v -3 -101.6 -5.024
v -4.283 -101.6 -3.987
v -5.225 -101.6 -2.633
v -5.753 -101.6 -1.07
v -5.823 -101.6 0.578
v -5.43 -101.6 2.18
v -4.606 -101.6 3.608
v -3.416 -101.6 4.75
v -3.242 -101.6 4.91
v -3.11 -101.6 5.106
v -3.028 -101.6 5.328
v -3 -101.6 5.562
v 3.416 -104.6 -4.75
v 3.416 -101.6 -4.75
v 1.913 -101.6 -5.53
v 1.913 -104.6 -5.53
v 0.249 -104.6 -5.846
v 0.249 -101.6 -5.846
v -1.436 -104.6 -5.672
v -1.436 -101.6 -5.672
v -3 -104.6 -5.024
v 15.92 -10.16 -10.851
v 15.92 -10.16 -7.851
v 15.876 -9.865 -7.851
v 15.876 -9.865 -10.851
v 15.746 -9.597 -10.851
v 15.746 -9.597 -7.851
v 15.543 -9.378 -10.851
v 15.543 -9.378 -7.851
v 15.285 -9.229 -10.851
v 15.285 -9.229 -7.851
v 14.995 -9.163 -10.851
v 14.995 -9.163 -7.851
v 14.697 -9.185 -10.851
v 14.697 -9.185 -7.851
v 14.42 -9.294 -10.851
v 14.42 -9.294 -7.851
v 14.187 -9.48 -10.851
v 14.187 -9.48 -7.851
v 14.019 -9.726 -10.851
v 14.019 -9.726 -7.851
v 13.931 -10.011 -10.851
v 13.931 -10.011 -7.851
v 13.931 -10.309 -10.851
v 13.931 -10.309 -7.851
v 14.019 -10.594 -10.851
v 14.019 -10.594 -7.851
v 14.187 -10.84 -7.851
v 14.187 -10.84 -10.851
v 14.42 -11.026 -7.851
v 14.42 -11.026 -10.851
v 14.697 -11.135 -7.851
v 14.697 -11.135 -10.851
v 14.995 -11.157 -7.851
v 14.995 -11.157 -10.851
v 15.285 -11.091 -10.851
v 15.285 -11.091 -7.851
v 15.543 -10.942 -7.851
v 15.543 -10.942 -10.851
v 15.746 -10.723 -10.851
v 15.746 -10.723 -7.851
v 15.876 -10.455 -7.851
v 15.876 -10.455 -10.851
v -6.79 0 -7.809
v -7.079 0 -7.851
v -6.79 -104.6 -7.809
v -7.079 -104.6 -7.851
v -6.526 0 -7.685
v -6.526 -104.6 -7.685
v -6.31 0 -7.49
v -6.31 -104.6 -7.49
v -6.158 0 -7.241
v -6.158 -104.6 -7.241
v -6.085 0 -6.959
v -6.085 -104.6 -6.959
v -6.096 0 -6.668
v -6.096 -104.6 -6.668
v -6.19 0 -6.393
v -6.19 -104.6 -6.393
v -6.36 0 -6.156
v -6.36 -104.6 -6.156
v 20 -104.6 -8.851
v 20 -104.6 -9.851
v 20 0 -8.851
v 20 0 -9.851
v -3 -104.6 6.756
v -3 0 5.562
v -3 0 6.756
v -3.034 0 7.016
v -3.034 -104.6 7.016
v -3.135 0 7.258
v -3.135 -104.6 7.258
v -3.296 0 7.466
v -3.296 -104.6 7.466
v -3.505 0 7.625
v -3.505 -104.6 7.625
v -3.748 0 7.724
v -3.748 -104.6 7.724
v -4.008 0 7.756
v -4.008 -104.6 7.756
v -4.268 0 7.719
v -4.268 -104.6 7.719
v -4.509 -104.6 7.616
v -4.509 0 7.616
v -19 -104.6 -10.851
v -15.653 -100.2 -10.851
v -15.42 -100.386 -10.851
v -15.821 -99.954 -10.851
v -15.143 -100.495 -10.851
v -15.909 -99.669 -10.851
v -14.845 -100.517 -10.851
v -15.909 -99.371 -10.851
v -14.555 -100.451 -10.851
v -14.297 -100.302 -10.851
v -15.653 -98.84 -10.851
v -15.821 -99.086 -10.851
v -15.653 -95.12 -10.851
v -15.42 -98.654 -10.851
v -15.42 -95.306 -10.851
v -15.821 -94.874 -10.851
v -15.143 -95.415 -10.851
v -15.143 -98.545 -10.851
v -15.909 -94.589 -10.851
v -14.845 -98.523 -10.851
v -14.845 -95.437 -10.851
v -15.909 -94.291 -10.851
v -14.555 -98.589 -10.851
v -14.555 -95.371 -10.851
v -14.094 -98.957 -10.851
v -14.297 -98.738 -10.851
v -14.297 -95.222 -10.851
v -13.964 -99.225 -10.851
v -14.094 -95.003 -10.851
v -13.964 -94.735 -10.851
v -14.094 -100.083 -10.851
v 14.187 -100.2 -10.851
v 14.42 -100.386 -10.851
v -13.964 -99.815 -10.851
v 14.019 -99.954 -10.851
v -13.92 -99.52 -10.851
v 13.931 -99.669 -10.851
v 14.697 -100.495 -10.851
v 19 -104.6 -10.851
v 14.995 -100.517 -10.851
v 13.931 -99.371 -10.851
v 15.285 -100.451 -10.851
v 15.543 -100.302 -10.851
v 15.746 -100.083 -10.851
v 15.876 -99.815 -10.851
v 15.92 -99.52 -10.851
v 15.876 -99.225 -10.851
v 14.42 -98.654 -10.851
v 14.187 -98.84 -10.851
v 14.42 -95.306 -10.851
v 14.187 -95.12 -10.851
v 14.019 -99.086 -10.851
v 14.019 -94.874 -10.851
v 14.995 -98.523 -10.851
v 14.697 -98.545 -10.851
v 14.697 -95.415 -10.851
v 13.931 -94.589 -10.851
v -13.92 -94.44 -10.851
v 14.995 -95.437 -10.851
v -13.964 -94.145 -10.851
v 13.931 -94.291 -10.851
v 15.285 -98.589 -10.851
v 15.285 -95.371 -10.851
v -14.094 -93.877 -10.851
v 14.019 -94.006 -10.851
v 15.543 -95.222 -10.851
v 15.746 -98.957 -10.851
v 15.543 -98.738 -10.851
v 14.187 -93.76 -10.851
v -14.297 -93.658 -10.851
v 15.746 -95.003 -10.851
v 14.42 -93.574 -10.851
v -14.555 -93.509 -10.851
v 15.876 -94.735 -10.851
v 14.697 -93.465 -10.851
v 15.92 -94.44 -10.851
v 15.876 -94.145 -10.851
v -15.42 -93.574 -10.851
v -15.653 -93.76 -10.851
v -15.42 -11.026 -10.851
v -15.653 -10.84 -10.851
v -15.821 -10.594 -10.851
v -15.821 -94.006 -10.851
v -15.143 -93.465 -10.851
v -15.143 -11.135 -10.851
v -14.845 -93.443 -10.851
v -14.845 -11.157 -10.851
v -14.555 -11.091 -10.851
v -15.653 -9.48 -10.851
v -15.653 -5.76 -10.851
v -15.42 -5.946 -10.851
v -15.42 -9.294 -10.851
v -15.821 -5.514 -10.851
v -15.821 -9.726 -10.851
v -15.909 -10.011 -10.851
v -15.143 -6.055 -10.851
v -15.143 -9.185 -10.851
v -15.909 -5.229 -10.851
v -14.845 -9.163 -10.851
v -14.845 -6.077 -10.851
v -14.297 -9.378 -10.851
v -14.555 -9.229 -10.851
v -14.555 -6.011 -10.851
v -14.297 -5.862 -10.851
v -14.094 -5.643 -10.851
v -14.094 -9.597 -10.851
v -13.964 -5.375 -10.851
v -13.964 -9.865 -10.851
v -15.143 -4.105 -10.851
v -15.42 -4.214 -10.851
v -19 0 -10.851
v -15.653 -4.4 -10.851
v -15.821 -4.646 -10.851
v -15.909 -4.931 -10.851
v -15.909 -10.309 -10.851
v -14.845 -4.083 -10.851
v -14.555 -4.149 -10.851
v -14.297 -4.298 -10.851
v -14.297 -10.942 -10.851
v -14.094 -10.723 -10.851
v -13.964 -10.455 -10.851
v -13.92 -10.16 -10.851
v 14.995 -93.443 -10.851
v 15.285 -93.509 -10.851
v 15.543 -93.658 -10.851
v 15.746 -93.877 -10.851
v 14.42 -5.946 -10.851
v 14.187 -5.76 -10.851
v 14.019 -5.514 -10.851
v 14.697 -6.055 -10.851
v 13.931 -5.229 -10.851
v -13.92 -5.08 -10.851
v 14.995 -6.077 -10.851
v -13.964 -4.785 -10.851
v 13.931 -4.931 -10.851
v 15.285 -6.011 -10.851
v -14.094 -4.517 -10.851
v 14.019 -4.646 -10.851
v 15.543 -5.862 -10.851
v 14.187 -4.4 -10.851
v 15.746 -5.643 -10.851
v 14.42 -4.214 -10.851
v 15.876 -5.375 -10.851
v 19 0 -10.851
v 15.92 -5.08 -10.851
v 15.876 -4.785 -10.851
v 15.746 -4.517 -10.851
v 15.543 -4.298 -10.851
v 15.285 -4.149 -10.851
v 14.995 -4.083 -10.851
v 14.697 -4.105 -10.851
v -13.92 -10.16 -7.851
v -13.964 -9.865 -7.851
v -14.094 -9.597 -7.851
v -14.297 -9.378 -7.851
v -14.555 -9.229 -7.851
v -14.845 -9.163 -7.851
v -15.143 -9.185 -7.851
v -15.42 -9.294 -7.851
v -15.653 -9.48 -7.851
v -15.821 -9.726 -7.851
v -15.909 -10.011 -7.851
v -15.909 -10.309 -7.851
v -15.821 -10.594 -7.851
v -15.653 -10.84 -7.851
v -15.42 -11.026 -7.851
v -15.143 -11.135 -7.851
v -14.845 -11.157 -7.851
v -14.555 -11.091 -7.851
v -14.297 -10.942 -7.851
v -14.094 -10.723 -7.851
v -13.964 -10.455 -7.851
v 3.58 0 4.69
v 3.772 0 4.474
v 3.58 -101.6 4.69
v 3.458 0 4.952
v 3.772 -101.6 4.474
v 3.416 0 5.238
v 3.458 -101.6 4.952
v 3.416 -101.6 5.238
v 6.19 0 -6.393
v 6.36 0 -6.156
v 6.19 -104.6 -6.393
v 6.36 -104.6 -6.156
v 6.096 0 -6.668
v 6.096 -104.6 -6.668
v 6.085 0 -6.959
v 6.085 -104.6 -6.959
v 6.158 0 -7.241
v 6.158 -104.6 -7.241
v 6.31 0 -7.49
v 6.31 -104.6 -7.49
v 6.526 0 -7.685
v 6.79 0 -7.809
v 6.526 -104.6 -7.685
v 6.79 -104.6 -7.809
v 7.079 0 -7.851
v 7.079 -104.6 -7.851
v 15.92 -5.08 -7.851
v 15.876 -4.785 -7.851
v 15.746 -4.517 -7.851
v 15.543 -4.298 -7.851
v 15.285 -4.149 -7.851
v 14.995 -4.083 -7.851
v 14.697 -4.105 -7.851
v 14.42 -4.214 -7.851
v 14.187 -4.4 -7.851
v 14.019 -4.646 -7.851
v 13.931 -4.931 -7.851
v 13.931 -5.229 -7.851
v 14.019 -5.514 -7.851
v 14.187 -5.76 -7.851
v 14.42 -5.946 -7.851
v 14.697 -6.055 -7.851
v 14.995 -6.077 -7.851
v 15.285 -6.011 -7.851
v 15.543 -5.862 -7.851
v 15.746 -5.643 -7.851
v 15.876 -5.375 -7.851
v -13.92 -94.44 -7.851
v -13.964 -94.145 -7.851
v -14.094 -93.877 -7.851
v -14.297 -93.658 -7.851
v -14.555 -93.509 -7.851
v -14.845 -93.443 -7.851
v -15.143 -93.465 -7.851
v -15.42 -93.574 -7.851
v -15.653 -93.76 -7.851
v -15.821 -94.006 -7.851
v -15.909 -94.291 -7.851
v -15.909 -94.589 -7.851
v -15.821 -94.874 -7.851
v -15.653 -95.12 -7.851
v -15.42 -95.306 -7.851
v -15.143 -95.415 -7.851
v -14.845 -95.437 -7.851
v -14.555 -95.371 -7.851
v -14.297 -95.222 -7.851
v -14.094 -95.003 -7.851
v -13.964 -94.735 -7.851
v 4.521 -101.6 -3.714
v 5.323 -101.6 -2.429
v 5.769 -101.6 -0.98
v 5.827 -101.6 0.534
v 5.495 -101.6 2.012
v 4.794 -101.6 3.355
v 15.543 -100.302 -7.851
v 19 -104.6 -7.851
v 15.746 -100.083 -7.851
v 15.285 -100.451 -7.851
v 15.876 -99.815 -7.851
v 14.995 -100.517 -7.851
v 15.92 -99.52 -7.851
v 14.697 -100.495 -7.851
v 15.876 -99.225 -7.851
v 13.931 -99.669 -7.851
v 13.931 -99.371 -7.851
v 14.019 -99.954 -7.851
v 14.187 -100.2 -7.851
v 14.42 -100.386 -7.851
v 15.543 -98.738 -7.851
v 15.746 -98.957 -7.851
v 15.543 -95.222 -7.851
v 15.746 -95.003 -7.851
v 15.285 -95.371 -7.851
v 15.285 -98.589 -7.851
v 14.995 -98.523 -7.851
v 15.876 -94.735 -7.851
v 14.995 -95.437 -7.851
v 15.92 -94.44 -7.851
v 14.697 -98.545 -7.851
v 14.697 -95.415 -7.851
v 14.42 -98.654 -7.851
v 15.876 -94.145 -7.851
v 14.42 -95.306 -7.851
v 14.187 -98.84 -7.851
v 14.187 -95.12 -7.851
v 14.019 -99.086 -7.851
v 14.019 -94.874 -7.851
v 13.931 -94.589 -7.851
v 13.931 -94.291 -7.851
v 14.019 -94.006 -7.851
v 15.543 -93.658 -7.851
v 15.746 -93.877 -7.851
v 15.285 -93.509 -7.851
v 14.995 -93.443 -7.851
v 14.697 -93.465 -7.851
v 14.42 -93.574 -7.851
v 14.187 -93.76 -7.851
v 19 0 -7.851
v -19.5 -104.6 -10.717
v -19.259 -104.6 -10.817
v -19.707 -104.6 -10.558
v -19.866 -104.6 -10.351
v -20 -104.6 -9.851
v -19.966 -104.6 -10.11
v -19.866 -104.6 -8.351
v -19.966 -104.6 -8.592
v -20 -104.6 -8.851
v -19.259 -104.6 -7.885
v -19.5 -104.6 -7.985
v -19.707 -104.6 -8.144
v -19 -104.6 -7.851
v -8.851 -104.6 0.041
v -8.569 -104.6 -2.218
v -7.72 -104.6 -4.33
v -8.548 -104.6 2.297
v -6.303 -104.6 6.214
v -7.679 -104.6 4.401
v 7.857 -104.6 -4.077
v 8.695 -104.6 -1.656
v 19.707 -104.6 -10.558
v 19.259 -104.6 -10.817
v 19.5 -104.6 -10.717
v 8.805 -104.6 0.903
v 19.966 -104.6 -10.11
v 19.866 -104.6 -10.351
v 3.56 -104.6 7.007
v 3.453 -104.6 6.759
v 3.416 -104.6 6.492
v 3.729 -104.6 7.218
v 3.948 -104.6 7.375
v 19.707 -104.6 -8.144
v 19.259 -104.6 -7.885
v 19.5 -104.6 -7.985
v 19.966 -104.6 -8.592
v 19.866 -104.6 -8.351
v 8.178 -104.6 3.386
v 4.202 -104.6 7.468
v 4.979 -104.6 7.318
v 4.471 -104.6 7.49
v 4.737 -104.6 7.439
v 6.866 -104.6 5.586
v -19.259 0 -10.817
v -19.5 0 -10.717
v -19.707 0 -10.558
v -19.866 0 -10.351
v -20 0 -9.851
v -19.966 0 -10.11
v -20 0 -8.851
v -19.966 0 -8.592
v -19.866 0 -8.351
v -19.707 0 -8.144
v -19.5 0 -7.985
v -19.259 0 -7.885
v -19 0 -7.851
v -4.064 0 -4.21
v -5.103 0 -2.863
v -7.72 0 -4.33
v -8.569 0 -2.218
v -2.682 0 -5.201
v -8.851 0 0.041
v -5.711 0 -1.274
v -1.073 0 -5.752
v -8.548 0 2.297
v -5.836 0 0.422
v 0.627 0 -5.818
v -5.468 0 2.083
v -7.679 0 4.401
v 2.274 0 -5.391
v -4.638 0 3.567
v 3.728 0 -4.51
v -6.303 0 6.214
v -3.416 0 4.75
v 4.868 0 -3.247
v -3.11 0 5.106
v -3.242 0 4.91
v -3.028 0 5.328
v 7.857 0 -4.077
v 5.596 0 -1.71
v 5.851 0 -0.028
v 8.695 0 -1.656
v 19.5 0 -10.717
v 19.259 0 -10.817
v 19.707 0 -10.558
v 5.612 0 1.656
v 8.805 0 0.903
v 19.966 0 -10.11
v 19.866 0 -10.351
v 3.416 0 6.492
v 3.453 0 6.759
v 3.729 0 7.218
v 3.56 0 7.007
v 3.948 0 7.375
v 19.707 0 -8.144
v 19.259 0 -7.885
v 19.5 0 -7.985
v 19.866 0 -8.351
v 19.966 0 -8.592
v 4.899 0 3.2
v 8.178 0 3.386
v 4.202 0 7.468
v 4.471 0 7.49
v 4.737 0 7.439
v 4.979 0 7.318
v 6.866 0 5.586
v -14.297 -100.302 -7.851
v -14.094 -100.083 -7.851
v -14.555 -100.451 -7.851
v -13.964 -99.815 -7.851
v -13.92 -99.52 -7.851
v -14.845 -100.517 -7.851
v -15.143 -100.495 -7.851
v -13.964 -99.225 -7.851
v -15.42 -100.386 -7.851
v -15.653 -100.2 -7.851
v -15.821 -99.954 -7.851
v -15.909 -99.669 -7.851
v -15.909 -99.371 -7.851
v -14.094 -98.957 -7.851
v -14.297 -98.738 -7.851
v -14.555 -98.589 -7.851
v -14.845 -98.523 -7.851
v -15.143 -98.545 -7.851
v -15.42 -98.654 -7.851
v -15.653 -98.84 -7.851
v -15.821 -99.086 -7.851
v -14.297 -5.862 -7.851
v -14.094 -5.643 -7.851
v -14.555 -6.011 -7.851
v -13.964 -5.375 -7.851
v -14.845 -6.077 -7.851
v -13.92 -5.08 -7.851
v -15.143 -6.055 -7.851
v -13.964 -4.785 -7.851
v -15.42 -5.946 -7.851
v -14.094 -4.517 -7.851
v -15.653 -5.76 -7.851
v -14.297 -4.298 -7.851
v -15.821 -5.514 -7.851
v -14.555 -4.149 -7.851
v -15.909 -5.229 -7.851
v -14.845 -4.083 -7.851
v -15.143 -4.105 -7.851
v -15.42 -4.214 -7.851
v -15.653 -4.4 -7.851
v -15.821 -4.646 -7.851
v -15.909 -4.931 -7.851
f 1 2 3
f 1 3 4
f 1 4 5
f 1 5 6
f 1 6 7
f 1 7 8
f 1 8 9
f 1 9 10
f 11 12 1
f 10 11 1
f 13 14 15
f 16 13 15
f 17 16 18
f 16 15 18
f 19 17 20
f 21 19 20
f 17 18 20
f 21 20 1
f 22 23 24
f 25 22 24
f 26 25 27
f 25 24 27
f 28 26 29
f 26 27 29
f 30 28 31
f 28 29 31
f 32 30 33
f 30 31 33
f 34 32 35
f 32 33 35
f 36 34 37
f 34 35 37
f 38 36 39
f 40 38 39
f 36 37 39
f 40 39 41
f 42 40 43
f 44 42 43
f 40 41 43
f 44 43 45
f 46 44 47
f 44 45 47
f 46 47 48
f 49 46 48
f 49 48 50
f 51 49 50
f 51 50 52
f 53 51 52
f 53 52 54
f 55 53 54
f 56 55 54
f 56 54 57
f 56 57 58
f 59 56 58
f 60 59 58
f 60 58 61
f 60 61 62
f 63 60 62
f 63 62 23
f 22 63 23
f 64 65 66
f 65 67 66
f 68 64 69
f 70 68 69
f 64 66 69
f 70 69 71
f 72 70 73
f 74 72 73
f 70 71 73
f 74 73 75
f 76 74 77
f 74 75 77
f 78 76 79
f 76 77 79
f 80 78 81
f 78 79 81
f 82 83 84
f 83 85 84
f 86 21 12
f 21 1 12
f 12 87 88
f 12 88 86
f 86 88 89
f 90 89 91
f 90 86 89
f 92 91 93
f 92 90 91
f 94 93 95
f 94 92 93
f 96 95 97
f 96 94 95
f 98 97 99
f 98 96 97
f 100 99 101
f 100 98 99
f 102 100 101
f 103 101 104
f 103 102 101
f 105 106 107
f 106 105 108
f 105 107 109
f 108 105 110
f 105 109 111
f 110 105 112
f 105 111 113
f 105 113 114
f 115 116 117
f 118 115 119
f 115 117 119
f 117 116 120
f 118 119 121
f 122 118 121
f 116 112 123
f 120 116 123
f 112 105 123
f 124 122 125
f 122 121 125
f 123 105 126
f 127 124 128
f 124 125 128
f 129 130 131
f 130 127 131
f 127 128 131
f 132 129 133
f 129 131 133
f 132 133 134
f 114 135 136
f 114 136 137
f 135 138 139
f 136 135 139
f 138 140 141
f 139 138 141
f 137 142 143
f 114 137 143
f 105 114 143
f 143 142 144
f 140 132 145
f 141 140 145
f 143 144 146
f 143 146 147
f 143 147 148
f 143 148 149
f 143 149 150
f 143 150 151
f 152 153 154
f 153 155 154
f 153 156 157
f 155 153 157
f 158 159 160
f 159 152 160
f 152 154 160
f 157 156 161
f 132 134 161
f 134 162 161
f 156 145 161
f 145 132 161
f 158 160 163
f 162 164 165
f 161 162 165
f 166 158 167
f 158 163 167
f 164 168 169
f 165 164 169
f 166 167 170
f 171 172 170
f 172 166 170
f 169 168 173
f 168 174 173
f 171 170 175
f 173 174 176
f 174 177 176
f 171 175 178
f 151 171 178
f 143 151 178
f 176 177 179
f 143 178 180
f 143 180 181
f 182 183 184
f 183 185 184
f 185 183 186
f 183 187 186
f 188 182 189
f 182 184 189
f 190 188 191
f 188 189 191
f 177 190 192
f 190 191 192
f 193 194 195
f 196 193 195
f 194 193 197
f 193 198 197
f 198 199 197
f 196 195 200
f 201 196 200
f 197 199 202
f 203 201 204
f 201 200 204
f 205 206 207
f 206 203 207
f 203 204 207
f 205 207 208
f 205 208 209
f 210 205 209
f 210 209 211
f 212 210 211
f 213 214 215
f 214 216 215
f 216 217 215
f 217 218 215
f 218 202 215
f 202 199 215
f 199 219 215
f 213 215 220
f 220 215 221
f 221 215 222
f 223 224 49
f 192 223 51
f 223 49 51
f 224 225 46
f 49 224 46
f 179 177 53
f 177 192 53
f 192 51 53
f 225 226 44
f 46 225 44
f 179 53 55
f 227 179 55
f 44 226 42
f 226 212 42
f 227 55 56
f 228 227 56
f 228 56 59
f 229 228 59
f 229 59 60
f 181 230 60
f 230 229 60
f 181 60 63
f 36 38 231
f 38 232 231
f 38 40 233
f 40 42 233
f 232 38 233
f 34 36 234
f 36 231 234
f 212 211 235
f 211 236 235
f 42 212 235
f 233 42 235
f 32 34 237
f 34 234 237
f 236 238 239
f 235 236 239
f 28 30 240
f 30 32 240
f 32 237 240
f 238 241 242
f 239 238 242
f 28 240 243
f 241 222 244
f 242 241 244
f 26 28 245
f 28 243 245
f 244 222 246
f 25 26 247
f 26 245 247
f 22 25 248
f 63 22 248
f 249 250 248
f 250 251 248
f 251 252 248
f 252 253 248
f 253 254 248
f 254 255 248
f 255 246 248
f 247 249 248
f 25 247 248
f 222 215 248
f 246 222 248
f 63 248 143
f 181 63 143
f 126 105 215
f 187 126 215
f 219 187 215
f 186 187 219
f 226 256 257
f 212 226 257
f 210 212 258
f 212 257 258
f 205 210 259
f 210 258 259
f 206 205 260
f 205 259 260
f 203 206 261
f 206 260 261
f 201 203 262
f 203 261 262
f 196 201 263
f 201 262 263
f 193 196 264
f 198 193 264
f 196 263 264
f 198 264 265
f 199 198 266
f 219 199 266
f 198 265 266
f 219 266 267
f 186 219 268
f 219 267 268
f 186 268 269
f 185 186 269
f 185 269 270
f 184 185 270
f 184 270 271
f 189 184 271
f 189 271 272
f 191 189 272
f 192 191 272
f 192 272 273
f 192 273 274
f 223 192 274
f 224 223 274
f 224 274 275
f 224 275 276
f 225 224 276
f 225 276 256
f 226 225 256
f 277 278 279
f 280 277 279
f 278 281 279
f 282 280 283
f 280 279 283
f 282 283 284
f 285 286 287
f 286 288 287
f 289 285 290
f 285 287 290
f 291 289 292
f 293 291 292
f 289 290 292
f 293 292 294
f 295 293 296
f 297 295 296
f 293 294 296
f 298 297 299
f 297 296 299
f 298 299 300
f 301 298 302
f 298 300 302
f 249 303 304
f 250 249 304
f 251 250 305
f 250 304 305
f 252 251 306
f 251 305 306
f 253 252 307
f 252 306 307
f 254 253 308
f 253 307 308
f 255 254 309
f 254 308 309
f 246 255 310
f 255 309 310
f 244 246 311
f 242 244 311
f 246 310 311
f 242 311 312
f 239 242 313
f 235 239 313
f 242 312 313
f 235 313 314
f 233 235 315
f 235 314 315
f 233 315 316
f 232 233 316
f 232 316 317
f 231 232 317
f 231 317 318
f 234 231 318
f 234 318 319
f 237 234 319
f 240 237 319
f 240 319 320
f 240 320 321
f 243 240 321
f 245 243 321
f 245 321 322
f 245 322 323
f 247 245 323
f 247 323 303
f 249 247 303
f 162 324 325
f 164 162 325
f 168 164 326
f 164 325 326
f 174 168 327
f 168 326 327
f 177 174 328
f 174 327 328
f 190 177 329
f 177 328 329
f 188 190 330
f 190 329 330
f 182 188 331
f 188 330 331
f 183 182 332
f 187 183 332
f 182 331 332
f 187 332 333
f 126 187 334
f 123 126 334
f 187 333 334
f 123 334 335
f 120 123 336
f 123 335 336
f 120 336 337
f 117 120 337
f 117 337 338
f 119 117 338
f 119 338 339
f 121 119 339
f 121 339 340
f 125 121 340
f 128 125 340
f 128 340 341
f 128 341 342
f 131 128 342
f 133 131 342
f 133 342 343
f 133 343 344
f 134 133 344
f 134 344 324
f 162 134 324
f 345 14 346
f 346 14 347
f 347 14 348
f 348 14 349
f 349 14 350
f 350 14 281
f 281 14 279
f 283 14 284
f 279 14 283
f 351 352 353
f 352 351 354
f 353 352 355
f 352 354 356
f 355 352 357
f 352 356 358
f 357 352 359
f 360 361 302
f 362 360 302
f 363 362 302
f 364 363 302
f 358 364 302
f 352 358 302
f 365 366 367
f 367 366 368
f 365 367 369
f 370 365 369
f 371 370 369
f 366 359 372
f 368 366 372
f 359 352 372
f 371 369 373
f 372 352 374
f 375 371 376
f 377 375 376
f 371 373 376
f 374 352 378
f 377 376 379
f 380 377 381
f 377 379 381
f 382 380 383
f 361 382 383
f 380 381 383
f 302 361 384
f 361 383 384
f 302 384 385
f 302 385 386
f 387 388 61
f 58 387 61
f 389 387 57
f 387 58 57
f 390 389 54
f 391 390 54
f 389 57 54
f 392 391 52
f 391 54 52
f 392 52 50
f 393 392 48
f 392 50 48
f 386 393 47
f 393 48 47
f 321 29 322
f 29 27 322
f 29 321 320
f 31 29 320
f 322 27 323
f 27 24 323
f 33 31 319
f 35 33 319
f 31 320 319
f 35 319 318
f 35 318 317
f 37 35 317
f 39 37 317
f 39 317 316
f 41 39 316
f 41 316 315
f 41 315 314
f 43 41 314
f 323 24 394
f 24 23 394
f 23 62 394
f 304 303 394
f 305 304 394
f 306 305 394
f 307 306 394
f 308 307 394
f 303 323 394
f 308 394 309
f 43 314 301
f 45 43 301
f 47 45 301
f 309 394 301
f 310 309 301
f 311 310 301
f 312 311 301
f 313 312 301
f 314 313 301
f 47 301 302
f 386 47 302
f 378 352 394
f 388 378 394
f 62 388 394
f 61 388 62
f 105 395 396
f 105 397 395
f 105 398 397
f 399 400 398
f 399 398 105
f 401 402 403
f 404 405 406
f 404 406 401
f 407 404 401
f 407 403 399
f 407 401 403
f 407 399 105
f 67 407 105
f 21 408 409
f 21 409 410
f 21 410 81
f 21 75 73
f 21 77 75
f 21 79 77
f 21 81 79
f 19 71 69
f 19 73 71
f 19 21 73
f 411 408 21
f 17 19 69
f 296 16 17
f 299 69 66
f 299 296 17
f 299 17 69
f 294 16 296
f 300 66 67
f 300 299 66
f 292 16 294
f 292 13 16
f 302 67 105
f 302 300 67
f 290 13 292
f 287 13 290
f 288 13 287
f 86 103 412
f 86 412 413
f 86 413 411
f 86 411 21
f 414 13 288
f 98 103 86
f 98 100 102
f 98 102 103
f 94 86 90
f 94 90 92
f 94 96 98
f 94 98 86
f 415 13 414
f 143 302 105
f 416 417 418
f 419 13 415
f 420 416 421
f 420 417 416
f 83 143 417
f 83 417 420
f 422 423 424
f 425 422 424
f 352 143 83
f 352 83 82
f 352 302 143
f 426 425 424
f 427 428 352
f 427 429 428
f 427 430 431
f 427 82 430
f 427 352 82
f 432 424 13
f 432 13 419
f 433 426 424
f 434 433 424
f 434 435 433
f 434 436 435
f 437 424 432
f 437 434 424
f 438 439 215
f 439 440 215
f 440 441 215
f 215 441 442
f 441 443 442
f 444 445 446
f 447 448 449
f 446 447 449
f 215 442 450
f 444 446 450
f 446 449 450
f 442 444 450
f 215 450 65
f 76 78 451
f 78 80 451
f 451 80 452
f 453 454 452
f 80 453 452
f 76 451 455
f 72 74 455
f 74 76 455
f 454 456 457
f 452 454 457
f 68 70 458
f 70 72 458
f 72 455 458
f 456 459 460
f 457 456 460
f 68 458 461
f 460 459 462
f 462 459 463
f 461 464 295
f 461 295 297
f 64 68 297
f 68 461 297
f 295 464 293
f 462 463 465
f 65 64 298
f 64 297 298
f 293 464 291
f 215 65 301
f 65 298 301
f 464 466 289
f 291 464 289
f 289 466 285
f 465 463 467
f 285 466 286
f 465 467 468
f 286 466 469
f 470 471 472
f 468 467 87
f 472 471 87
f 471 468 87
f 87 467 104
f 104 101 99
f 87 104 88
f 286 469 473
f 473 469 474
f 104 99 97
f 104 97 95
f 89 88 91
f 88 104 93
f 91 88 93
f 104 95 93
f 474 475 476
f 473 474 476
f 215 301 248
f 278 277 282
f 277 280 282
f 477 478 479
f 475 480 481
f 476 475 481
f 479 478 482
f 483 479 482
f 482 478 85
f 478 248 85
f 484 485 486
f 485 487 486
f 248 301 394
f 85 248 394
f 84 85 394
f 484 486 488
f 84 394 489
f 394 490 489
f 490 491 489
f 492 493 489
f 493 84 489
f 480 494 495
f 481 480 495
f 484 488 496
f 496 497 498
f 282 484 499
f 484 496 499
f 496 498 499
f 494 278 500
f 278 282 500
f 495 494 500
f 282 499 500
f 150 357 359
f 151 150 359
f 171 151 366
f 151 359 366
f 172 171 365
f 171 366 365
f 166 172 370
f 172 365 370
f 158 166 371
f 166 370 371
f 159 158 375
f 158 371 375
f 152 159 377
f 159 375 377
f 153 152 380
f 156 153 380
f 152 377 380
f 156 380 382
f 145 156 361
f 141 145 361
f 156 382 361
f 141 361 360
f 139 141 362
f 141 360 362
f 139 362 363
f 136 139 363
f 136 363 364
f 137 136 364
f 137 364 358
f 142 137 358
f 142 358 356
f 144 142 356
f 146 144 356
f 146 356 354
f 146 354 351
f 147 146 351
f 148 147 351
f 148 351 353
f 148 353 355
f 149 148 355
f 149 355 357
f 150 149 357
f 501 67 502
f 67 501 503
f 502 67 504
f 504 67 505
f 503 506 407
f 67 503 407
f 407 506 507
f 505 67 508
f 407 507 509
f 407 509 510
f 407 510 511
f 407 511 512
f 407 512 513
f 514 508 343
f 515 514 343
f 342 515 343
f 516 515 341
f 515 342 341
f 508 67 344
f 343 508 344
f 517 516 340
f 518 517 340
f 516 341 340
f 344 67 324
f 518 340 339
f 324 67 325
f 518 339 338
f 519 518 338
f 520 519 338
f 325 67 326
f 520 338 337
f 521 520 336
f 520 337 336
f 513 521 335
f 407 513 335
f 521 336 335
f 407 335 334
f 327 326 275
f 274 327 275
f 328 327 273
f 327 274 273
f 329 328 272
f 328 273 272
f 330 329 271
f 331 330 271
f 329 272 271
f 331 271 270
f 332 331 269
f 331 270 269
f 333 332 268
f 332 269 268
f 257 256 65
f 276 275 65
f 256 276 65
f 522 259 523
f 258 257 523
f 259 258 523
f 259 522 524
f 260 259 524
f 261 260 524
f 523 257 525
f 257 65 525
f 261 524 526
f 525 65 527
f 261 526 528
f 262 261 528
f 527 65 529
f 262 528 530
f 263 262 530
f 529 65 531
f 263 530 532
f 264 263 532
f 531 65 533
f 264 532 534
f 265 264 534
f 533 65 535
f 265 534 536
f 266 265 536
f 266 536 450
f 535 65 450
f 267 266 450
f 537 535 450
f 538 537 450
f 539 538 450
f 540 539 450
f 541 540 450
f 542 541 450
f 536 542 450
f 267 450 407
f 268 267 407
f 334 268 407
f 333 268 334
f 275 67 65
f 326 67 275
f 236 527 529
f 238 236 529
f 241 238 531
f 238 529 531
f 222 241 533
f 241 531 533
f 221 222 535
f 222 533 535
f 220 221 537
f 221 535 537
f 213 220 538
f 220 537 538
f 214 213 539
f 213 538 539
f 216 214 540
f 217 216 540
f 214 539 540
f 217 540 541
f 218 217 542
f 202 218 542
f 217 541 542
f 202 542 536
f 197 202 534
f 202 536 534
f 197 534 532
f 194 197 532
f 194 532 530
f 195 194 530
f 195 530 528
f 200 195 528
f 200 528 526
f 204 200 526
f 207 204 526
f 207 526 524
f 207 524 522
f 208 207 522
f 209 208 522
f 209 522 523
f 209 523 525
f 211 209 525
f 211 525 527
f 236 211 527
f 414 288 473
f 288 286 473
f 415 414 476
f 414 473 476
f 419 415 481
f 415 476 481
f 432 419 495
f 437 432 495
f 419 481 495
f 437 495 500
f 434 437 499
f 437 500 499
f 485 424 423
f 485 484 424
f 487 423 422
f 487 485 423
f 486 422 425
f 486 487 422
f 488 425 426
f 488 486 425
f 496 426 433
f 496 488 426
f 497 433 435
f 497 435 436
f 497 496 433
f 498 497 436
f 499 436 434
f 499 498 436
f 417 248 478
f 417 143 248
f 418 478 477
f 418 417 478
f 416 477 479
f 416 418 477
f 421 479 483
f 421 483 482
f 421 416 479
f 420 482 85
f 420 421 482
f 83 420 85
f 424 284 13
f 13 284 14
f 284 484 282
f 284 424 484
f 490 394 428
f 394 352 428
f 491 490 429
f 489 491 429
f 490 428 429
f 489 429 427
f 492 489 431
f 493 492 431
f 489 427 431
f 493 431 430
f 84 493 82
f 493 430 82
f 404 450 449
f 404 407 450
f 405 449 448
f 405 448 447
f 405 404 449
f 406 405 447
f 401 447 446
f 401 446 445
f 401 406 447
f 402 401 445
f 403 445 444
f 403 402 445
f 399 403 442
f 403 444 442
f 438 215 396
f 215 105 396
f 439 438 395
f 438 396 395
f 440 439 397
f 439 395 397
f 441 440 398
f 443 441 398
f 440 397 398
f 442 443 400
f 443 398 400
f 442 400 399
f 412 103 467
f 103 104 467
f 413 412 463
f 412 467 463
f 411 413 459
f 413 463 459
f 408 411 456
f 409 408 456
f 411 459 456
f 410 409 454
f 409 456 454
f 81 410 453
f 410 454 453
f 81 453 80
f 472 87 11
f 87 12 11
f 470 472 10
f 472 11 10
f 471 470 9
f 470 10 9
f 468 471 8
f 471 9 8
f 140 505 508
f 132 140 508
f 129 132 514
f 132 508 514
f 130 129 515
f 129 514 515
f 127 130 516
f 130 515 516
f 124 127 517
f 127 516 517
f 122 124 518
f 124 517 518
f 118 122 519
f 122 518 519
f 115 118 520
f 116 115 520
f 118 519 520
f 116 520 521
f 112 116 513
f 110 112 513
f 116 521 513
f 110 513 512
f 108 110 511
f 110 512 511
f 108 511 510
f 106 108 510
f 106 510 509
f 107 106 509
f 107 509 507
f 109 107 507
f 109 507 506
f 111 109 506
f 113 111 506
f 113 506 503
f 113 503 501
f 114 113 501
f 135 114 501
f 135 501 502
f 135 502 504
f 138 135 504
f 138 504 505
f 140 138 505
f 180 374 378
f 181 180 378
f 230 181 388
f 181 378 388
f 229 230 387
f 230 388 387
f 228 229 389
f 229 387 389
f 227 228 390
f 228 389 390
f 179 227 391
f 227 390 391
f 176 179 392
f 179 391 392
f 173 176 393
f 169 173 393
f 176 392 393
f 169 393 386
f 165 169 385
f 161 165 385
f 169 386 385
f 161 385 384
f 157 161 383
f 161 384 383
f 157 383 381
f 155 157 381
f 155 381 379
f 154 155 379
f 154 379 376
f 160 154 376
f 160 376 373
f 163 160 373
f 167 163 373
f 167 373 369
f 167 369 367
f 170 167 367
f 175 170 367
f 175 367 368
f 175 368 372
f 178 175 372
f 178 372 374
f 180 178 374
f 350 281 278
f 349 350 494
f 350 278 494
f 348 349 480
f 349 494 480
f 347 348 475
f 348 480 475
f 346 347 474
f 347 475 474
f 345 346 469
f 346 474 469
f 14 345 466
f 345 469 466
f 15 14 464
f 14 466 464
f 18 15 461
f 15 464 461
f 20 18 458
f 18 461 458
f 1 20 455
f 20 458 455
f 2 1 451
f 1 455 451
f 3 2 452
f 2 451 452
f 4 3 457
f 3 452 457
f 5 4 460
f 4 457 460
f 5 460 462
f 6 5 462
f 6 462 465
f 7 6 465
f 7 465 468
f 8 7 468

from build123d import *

# Parameters (mm, degrees)
F1_DEPTH = 101.6
F3_DEPTH = 3
F4_R     = 1
F5_DEPTH = 25.4
F6_R     = 1
F7_R     = 1


with BuildPart() as f1:
    # F0 (on Front) → F1 (new body)
    with BuildSketch(Plane.XZ):
        with BuildLine():
            ThreePointArc((3.4161663997, 4.7504878758), (-0.2489109402, -5.8459705159), (-3, 5.0236767341))
            Line((-3, 5.0236767341), (-3, 8.3273603964))
            ThreePointArc((-3, 8.3273603964), (-8.83136125, 0.5932871507), (-4.0868734277, -7.8512672071))
            Line((-4.0868734277, -7.8512672071), (-20, -7.8512672071))
            Line((-20, -7.8512672071), (-20, -10.8512672071))
            Line((-20, -10.8512672071), (20, -10.8512672071))
            Line((20, -10.8512672071), (20, -7.8512672071))
            Line((20, -7.8512672071), (4.0868734277, -7.8512672071))
            ThreePointArc((4.0868734277, -7.8512672071), (8.8435168288, 0.3703258964), (3.4161663997, 8.165460079))
            Line((3.4161663997, 8.165460079), (3.4161663997, 4.7504878758))
        make_face()
    extrude(amount=F1_DEPTH)

    # F2 (on face) → F3 (join)
    with BuildSketch(Plane.XZ.offset(101.6)):
        with BuildLine():
            Line((-3, -5.0236767341), (-3, 8.3273603964))
            ThreePointArc((-3, 8.3273603964), (-8.83136125, 0.5932871507), (-4.0868734277, -7.8512672071))
            Line((-4.0868734277, -7.8512672071), (-20, -7.8512672071))
            Line((-20, -7.8512672071), (-20, -10.8512672071))
            Line((-20, -10.8512672071), (20, -10.8512672071))
            Line((20, -10.8512672071), (20, -7.8512672071))
            Line((20, -7.8512672071), (4.0868734277, -7.8512672071))
            ThreePointArc((4.0868734277, -7.8512672071), (8.8435168288, 0.3703258964), (3.4161663997, 8.165460079))
            Line((3.4161663997, 8.165460079), (3.4161663997, -4.7504878758))
            ThreePointArc((3.4161663997, -4.7504878758), (0.2489109402, -5.8459705159), (-3, -5.0236767341))
        make_face()
    extrude(amount=F3_DEPTH)

    # F4 (on Top) → F5 (cut)
    with BuildSketch(Plane.XY):
        with Locations((-14.92, -5.08)):
            Circle(F4_R)
        with Locations((-14.92, -10.16)):
            Circle(F4_R)
        with Locations((-14.92, -99.52)):
            Circle(F4_R)
        with Locations((-14.92, -94.44)):
            Circle(F4_R)
        with Locations((14.92, -99.52)):
            Circle(F4_R)
        with Locations((14.92, -94.44)):
            Circle(F4_R)
        with Locations((14.92, -10.16)):
            Circle(F4_R)
        with Locations((14.92, -5.08)):
            Circle(F4_R)
    extrude(amount=-F5_DEPTH, mode=Mode.SUBTRACT)

    # F6
    f6_edges = [f1.edges().sort_by_distance(p)[0] for p in [
        (-3, -52.3, 8.32736),
        (3.416166, -52.3, 8.16546),
        (-3, -50.8, 5.023677),
        (3.416166, -50.8, 4.750488),
    ]]
    fillet(f6_edges, radius=F6_R)

    # F7
    f7_edges = [f1.edges().sort_by_distance(p)[0] for p in [
        (20, -52.3, -7.851267),
        (20, -52.3, -10.851267),
        (-20, -52.3, -7.851267),
        (-20, -52.3, -10.851267),
        (4.086873, -52.3, -7.851267),
        (-4.086873, -52.3, -7.851267),
    ]]
    fillet(f7_edges, radius=F7_R)


solid = f1.part
